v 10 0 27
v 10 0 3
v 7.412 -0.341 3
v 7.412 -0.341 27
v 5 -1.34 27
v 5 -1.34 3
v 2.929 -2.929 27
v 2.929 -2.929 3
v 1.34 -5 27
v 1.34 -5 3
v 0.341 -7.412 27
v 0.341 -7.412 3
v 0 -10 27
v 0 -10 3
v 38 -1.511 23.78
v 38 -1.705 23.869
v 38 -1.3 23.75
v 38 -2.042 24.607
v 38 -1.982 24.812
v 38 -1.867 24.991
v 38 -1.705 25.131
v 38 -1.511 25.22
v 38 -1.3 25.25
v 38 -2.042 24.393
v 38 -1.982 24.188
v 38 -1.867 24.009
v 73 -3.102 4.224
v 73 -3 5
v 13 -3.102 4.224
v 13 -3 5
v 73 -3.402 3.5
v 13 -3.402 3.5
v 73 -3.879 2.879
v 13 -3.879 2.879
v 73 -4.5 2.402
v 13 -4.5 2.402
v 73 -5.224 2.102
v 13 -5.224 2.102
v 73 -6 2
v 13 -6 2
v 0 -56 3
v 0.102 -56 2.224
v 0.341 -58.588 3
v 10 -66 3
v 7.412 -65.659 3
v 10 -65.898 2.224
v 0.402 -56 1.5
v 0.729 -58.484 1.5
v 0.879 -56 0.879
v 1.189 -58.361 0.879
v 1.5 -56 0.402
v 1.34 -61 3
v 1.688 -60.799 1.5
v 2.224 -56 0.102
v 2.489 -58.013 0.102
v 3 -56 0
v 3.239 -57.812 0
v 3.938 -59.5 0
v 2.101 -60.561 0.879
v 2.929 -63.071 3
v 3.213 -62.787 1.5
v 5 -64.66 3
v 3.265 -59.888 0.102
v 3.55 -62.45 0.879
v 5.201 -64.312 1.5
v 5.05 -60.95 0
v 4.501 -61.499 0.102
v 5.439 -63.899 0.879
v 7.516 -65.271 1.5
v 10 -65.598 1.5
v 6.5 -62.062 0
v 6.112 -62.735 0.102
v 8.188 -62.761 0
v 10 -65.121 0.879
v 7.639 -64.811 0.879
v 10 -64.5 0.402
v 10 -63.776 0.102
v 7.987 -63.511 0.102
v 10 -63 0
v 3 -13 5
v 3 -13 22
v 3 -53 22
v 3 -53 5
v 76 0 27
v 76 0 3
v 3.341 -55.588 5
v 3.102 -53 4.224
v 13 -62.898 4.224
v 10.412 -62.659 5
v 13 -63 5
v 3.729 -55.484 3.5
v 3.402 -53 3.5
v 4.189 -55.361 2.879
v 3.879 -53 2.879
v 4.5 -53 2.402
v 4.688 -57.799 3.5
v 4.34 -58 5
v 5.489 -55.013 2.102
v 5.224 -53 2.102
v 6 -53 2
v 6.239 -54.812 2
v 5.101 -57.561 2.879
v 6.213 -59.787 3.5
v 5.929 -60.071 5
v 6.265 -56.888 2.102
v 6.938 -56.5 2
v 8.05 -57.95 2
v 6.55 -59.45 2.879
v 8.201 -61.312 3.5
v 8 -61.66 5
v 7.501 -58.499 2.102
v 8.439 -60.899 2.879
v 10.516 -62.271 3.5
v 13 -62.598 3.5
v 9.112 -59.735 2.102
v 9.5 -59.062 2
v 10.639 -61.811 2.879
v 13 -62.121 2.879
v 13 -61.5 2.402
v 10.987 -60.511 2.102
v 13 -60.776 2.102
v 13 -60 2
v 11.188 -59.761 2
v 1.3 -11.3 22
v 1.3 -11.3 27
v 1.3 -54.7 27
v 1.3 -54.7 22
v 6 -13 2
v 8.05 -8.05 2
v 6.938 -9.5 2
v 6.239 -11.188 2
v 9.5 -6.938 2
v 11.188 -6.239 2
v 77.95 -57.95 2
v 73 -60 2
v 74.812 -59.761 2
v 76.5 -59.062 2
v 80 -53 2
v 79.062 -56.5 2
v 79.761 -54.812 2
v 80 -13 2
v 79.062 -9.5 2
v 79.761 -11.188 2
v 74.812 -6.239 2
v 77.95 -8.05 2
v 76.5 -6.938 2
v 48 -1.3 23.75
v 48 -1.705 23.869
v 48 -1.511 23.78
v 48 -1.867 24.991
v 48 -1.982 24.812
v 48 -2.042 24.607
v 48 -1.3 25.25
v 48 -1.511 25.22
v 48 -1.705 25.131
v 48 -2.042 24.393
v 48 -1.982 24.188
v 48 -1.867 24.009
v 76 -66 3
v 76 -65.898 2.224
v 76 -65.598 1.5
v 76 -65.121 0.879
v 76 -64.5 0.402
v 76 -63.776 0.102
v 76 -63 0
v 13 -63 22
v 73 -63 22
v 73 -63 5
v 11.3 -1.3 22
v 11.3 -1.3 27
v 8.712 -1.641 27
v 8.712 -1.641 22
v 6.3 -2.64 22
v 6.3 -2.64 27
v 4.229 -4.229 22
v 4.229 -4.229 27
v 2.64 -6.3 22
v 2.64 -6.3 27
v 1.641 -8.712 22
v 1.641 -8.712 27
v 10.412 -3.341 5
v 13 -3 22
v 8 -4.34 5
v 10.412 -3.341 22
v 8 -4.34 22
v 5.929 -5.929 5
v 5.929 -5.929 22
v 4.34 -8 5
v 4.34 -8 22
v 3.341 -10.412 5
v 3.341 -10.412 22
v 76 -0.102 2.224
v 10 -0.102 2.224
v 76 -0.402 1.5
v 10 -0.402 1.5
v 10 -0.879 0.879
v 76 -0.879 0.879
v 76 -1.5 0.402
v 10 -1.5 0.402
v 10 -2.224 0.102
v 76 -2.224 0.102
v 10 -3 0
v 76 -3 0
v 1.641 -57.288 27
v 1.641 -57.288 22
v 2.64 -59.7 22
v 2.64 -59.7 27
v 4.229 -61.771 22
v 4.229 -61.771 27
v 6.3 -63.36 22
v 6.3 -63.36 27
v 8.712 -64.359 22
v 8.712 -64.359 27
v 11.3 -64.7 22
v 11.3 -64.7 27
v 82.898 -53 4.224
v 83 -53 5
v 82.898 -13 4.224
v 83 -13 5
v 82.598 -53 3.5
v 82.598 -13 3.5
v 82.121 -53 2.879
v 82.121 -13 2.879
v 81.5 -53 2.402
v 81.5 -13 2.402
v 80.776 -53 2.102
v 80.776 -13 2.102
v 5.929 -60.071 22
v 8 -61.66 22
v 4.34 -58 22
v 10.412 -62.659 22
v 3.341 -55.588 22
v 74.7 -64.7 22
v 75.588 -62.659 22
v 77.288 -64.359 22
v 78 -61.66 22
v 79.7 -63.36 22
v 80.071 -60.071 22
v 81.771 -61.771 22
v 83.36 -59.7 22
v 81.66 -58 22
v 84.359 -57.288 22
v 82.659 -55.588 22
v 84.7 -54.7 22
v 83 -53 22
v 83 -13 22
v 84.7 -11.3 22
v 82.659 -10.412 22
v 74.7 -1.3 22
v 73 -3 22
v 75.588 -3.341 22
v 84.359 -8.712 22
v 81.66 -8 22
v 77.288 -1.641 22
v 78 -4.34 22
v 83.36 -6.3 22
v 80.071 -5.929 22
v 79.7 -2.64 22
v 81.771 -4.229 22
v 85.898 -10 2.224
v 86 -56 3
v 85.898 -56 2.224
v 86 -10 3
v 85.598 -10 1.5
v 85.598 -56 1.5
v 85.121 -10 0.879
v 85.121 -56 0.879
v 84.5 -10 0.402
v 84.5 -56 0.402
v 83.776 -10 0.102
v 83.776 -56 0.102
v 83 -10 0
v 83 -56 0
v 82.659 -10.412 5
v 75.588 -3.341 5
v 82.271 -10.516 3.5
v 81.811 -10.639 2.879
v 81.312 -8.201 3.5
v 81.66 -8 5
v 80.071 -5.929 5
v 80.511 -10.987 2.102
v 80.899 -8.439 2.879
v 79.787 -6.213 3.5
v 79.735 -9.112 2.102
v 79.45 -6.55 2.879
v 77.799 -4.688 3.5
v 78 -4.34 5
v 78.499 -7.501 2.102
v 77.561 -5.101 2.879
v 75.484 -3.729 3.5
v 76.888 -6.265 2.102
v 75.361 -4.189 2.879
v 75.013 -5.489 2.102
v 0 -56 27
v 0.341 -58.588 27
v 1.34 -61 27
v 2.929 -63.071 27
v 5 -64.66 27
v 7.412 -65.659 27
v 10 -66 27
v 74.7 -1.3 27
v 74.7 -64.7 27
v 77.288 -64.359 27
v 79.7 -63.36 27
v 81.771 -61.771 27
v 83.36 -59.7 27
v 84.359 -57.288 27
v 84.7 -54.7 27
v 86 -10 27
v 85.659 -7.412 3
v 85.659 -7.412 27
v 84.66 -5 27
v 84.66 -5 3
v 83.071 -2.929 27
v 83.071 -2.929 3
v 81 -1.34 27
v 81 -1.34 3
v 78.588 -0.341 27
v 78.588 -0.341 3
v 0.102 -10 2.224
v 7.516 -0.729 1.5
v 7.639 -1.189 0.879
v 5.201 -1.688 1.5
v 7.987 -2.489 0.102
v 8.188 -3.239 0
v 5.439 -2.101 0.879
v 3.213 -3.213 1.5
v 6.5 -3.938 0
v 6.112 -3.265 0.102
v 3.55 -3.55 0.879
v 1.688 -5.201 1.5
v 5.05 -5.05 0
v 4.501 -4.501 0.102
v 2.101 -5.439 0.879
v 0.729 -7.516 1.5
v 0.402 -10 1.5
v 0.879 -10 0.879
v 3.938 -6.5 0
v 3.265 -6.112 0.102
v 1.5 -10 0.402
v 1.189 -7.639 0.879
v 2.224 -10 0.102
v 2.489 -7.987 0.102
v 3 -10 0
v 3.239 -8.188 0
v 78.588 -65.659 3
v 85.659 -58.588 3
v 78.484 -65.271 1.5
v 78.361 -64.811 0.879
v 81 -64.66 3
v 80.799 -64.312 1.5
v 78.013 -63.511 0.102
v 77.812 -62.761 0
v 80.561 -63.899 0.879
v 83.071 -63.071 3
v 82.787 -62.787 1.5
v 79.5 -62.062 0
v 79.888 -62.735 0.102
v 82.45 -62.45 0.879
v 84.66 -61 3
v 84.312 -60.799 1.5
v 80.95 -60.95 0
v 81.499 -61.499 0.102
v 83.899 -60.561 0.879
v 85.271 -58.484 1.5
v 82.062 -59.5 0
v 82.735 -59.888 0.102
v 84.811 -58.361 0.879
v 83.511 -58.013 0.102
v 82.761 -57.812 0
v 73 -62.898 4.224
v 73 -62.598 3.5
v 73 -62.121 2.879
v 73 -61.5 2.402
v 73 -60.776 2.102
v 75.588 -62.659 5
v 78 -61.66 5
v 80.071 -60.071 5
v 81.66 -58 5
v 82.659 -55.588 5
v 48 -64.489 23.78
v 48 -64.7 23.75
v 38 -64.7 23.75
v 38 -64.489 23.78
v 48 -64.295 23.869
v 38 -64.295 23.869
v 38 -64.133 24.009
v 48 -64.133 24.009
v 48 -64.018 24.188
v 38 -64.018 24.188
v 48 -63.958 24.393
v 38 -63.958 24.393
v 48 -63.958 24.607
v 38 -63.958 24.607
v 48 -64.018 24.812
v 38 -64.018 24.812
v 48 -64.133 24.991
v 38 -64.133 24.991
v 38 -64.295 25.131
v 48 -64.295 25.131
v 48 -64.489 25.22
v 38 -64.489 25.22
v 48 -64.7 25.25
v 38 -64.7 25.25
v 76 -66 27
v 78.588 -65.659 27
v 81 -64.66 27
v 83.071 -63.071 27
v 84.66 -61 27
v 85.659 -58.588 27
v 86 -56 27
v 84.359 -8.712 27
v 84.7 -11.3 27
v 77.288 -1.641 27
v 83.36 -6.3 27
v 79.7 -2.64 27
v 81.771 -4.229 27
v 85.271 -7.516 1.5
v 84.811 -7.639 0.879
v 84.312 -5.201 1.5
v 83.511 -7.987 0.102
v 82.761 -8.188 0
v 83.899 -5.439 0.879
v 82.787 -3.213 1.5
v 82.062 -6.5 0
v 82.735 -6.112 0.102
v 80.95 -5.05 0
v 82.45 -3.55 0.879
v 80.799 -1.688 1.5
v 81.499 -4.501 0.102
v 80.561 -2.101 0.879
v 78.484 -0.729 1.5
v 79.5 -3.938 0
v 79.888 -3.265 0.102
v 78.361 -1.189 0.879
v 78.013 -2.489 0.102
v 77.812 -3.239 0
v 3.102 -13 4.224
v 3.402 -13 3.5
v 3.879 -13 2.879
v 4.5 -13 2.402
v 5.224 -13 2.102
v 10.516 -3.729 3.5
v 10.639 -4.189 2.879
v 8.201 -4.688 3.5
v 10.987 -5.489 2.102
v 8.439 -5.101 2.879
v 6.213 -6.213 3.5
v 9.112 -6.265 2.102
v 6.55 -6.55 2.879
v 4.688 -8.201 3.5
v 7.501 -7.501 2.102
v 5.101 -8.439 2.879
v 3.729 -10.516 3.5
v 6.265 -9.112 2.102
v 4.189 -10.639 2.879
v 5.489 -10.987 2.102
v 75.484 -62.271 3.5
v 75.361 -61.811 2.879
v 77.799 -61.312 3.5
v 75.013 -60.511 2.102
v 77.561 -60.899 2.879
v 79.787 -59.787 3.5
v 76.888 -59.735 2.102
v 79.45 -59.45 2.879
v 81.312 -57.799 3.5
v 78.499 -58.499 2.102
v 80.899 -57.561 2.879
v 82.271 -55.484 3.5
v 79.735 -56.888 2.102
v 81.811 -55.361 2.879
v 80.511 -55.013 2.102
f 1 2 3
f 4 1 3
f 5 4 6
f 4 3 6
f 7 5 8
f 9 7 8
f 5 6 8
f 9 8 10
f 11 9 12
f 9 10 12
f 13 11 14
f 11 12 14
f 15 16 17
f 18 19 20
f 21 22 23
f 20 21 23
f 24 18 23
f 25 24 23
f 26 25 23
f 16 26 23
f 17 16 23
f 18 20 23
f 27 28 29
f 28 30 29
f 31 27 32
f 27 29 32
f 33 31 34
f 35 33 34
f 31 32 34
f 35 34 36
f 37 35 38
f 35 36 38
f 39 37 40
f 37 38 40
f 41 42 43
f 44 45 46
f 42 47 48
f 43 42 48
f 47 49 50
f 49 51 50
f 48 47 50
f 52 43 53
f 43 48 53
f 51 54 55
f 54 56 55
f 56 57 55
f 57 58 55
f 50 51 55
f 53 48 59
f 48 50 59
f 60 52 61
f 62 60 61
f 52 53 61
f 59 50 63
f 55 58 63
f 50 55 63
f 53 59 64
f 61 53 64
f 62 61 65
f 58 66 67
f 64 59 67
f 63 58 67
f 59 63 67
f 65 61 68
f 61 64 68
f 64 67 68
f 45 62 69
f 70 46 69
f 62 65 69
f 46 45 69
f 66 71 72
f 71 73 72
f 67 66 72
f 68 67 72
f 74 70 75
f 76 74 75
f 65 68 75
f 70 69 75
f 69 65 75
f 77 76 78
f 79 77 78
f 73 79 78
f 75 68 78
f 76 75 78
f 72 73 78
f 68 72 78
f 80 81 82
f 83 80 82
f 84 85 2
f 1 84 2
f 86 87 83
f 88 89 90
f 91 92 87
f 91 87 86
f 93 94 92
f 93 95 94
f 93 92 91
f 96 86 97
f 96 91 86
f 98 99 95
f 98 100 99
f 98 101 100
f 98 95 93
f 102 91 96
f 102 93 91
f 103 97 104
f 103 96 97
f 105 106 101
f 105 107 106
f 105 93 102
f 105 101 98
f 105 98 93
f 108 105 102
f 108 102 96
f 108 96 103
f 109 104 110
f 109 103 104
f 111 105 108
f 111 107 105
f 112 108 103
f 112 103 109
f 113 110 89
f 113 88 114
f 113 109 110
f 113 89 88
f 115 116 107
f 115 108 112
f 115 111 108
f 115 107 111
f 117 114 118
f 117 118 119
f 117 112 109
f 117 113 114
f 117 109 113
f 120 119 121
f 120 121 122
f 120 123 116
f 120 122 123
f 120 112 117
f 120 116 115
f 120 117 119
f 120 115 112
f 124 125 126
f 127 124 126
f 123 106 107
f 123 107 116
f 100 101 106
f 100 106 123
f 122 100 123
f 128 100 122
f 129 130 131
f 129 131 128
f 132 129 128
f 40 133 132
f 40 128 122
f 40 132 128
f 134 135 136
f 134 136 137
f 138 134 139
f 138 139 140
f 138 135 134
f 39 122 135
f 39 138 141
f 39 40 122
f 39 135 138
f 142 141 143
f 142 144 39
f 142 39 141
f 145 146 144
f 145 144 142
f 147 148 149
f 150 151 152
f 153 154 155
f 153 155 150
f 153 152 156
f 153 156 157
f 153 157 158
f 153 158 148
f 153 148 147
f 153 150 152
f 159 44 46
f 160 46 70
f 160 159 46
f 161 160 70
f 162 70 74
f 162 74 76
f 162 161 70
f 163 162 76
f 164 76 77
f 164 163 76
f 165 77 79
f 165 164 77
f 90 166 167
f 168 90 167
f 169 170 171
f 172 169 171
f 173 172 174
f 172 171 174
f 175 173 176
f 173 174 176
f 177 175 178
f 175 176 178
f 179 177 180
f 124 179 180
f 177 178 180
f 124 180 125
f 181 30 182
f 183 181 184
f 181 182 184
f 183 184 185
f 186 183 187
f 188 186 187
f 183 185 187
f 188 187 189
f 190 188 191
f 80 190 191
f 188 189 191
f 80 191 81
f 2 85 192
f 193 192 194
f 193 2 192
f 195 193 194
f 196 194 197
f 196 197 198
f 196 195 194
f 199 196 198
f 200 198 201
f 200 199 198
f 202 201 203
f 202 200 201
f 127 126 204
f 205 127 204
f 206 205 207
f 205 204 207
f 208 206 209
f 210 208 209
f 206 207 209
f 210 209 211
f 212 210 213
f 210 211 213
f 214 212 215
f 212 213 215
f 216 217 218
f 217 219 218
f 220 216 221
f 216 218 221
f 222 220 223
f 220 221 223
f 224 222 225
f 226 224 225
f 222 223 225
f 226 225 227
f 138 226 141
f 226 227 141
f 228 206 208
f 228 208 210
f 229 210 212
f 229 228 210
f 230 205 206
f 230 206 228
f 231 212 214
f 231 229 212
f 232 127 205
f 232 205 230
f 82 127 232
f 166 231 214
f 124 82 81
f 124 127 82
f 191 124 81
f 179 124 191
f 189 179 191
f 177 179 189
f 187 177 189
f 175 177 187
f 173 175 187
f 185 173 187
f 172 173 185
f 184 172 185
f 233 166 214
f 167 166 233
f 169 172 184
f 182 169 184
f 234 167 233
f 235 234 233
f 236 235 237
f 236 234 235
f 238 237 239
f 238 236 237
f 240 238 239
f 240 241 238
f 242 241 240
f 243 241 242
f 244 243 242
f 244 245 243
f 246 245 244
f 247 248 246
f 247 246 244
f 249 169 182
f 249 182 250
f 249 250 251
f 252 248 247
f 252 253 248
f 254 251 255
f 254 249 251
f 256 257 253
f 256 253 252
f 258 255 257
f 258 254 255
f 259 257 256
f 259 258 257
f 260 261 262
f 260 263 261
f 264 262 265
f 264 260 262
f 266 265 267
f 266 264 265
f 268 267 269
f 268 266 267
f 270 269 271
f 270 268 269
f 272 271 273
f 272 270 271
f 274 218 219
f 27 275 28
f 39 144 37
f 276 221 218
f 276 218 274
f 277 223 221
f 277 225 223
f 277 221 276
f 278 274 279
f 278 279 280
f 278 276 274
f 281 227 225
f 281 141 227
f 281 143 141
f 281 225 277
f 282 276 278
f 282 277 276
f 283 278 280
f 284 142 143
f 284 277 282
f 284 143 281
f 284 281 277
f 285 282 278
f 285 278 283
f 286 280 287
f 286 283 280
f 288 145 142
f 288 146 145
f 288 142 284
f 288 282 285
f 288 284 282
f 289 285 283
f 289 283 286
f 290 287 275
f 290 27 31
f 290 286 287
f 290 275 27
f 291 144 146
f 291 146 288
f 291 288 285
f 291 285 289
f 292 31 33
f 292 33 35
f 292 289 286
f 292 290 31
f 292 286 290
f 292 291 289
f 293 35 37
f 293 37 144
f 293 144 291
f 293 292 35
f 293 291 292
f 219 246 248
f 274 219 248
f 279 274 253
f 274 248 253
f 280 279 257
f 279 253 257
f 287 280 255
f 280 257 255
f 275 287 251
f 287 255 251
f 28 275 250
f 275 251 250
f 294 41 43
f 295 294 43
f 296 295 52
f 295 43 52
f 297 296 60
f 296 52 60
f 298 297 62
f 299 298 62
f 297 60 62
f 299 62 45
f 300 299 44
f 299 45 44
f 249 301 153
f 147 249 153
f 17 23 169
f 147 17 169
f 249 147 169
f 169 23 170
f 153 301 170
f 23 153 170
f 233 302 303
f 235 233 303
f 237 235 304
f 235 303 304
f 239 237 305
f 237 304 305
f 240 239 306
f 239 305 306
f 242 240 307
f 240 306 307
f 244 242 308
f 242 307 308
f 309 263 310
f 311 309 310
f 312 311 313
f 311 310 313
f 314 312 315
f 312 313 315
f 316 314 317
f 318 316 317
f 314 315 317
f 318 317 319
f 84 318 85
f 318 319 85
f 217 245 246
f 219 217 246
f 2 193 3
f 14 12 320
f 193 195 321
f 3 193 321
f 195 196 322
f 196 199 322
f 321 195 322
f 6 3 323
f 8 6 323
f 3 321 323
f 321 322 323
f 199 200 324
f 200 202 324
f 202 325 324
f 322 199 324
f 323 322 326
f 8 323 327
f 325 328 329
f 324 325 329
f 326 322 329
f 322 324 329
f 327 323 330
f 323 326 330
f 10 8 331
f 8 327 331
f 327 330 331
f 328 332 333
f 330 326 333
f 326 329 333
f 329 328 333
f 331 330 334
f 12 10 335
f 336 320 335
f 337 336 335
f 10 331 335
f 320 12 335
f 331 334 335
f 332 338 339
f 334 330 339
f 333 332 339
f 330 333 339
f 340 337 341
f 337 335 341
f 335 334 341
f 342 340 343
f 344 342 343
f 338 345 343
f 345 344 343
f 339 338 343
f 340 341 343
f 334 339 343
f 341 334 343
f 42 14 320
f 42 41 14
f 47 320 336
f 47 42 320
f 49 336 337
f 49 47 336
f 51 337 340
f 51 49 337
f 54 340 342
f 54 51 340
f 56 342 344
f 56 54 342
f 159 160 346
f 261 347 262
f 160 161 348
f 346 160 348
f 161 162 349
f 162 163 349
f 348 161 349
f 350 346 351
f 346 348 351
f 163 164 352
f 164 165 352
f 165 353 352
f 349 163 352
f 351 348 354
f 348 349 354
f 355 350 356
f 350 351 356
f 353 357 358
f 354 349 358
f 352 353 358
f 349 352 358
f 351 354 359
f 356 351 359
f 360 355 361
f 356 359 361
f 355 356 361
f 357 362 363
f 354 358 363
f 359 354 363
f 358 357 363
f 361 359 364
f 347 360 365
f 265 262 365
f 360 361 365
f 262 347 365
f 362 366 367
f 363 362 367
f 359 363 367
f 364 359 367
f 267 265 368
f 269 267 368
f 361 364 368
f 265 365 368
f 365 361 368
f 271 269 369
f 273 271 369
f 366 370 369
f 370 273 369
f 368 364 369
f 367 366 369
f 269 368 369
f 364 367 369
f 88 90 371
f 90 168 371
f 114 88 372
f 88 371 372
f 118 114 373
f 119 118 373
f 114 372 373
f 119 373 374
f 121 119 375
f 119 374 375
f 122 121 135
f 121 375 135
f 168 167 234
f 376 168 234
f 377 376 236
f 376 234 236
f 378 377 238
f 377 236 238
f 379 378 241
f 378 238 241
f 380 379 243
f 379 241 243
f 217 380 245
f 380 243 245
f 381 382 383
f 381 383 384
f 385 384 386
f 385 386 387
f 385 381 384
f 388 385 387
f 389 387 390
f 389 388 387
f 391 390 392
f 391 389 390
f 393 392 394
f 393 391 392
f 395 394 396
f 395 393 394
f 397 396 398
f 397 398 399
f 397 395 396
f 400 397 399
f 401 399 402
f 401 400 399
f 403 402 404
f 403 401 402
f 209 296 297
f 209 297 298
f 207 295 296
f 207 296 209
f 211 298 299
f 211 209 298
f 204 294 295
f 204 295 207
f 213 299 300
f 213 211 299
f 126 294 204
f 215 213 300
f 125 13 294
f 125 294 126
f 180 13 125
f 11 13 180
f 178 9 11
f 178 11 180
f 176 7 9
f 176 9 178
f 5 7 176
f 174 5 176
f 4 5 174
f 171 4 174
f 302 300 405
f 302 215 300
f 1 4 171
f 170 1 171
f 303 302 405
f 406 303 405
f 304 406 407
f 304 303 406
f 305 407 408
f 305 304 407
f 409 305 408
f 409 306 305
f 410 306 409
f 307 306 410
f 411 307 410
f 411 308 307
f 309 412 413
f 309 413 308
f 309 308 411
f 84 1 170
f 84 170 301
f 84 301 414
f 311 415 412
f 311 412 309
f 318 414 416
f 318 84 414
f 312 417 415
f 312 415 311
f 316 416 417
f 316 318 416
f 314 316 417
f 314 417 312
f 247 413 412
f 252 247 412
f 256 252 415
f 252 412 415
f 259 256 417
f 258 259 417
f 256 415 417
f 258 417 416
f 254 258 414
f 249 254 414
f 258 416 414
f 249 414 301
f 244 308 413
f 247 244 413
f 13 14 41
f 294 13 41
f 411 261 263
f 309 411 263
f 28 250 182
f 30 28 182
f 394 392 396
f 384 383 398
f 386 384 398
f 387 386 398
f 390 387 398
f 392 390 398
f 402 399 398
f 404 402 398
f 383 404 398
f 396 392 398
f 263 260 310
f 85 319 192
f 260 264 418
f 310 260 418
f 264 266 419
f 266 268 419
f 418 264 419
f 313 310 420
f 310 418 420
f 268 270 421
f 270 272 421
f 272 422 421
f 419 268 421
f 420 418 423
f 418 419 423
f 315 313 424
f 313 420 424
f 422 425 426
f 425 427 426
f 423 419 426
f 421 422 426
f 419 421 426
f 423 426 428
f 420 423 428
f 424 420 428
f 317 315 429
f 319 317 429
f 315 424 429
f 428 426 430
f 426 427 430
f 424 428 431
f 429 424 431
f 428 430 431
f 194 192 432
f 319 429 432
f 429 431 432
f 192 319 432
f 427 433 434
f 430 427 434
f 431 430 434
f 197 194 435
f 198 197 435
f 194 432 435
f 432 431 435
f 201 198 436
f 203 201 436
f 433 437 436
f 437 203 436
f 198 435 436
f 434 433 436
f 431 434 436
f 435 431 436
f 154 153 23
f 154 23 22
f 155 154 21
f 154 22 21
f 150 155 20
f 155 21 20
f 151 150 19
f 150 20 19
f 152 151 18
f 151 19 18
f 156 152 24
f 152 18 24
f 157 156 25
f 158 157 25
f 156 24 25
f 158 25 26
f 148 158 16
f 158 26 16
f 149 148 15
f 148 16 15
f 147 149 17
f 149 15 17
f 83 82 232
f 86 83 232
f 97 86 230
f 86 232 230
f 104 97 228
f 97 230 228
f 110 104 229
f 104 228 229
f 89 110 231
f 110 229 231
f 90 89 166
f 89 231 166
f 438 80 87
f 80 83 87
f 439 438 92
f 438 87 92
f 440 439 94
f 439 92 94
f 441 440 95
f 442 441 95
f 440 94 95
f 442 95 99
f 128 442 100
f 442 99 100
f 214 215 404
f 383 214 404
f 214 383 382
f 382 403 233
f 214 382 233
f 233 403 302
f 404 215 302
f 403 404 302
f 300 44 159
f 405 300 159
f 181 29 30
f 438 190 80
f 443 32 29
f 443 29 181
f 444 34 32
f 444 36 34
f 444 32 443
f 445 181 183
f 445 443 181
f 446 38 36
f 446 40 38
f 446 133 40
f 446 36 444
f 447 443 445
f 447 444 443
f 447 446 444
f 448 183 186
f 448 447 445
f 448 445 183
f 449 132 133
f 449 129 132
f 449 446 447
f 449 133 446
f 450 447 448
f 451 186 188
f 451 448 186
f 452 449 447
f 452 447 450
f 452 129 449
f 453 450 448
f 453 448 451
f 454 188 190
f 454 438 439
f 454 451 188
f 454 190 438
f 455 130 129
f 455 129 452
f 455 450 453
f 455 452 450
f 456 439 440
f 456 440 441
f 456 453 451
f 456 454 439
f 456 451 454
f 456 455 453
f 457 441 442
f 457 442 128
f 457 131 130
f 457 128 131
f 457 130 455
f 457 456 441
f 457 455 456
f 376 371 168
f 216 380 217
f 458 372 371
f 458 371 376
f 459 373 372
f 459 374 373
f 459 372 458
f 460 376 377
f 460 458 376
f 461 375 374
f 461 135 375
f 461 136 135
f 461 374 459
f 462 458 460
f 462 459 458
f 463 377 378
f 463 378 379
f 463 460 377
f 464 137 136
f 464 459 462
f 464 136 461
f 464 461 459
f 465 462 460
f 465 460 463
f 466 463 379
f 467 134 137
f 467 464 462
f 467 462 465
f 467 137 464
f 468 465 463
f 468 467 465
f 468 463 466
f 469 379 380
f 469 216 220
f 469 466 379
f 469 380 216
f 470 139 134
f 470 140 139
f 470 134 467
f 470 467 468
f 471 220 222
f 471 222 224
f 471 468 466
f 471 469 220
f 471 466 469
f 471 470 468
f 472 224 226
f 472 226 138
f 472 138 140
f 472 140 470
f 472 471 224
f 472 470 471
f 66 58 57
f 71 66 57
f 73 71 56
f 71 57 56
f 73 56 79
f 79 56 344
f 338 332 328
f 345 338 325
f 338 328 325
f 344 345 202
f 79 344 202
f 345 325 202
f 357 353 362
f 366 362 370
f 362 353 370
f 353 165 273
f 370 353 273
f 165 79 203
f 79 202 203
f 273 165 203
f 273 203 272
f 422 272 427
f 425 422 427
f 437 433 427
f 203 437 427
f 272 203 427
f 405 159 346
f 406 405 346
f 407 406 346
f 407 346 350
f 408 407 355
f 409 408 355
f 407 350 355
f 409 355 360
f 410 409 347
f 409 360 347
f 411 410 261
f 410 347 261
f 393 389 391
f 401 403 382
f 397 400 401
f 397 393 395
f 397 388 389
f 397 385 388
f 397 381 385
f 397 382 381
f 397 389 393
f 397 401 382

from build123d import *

# Parameters (mm, degrees)
F1_DEPTH  = 27
F3_DEPTH  = 25
F5_DEPTH  = 5
F6_R      = 3
F7_R      = 3
F9_R      = 0.75
F10_DEPTH = 5


with BuildPart() as f1:
    # F0 (on Top) → F1 (new body)
    with BuildSketch(Plane.XY):
        with BuildLine():
            Line((76, 0), (10, 0))
            ThreePointArc((10, 0), (2.928932, -2.928932), (0, -10))
            Line((0, -10), (0, -56))
            ThreePointArc((0, -56), (2.928932, -63.071068), (10, -66))
            Line((10, -66), (76, -66))
            ThreePointArc((76, -66), (83.071068, -63.071068), (86, -56))
            Line((86, -56), (86, -10))
            ThreePointArc((86, -10), (83.071068, -2.928932), (76, 0))
        make_face()
    extrude(amount=F1_DEPTH)

    # F2 (on face) → F3 (cut)
    with BuildSketch(Plane.XY.offset(27)):
        with BuildLine():
            Line((73, -3), (13, -3))
            ThreePointArc((13, -3), (5.928932, -5.928932), (3, -13))
            Line((3, -13), (3, -53))
            ThreePointArc((3, -53), (5.928932, -60.071068), (13, -63))
            Line((13, -63), (73, -63))
            ThreePointArc((73, -63), (80.071068, -60.071068), (83, -53))
            Line((83, -53), (83, -13))
            ThreePointArc((83, -13), (80.071068, -5.928932), (73, -3))
        make_face()
    extrude(amount=-F3_DEPTH, mode=Mode.SUBTRACT)

    # F4 (on face) → F5 (cut)
    with BuildSketch(Plane.XY.offset(27)):
        with BuildLine():
            Line((74.7, -1.3), (11.3, -1.3))
            ThreePointArc((11.3, -1.3), (4.228932, -4.228932), (1.3, -11.3))
            Line((1.3, -11.3), (1.3, -54.7))
            ThreePointArc((1.3, -54.7), (4.228932, -61.771068), (11.3, -64.7))
            Line((11.3, -64.7), (74.7, -64.7))
            ThreePointArc((74.7, -64.7), (81.771068, -61.771068), (84.7, -54.7))
            Line((84.7, -54.7), (84.7, -11.3))
            ThreePointArc((84.7, -11.3), (81.771068, -4.228932), (74.7, -1.3))
        make_face()
    extrude(amount=-F5_DEPTH, mode=Mode.SUBTRACT)

    # F6
    f6_edges = [f1.edges().sort_by_distance(p)[0] for p in [
        (43, 0, 0),
        (2.928932, -2.928932, 0),
        (0, -33, 0),
        (83.071068, -2.928932, 0),
        (86, -33, 0),
        (83.071068, -63.071068, 0),
        (43, -66, 0),
        (2.928932, -63.071068, 0),
    ]]
    fillet(f6_edges, radius=F6_R)

    # F7
    f7_edges = [f1.edges().sort_by_distance(p)[0] for p in [
        (43, -3, 2),
    ]]
    fillet(f7_edges, radius=F7_R)

    # F9 (on offset) → F10 (join, symmetric)
    with BuildSketch(Plane.YZ.offset(43)):
        with Locations((-1.3, 24.5)):
            Circle(F9_R)
        with Locations((-64.7, 24.5)):
            Circle(F9_R)
    extrude(amount=F10_DEPTH, both=True)


solid = f1.part
